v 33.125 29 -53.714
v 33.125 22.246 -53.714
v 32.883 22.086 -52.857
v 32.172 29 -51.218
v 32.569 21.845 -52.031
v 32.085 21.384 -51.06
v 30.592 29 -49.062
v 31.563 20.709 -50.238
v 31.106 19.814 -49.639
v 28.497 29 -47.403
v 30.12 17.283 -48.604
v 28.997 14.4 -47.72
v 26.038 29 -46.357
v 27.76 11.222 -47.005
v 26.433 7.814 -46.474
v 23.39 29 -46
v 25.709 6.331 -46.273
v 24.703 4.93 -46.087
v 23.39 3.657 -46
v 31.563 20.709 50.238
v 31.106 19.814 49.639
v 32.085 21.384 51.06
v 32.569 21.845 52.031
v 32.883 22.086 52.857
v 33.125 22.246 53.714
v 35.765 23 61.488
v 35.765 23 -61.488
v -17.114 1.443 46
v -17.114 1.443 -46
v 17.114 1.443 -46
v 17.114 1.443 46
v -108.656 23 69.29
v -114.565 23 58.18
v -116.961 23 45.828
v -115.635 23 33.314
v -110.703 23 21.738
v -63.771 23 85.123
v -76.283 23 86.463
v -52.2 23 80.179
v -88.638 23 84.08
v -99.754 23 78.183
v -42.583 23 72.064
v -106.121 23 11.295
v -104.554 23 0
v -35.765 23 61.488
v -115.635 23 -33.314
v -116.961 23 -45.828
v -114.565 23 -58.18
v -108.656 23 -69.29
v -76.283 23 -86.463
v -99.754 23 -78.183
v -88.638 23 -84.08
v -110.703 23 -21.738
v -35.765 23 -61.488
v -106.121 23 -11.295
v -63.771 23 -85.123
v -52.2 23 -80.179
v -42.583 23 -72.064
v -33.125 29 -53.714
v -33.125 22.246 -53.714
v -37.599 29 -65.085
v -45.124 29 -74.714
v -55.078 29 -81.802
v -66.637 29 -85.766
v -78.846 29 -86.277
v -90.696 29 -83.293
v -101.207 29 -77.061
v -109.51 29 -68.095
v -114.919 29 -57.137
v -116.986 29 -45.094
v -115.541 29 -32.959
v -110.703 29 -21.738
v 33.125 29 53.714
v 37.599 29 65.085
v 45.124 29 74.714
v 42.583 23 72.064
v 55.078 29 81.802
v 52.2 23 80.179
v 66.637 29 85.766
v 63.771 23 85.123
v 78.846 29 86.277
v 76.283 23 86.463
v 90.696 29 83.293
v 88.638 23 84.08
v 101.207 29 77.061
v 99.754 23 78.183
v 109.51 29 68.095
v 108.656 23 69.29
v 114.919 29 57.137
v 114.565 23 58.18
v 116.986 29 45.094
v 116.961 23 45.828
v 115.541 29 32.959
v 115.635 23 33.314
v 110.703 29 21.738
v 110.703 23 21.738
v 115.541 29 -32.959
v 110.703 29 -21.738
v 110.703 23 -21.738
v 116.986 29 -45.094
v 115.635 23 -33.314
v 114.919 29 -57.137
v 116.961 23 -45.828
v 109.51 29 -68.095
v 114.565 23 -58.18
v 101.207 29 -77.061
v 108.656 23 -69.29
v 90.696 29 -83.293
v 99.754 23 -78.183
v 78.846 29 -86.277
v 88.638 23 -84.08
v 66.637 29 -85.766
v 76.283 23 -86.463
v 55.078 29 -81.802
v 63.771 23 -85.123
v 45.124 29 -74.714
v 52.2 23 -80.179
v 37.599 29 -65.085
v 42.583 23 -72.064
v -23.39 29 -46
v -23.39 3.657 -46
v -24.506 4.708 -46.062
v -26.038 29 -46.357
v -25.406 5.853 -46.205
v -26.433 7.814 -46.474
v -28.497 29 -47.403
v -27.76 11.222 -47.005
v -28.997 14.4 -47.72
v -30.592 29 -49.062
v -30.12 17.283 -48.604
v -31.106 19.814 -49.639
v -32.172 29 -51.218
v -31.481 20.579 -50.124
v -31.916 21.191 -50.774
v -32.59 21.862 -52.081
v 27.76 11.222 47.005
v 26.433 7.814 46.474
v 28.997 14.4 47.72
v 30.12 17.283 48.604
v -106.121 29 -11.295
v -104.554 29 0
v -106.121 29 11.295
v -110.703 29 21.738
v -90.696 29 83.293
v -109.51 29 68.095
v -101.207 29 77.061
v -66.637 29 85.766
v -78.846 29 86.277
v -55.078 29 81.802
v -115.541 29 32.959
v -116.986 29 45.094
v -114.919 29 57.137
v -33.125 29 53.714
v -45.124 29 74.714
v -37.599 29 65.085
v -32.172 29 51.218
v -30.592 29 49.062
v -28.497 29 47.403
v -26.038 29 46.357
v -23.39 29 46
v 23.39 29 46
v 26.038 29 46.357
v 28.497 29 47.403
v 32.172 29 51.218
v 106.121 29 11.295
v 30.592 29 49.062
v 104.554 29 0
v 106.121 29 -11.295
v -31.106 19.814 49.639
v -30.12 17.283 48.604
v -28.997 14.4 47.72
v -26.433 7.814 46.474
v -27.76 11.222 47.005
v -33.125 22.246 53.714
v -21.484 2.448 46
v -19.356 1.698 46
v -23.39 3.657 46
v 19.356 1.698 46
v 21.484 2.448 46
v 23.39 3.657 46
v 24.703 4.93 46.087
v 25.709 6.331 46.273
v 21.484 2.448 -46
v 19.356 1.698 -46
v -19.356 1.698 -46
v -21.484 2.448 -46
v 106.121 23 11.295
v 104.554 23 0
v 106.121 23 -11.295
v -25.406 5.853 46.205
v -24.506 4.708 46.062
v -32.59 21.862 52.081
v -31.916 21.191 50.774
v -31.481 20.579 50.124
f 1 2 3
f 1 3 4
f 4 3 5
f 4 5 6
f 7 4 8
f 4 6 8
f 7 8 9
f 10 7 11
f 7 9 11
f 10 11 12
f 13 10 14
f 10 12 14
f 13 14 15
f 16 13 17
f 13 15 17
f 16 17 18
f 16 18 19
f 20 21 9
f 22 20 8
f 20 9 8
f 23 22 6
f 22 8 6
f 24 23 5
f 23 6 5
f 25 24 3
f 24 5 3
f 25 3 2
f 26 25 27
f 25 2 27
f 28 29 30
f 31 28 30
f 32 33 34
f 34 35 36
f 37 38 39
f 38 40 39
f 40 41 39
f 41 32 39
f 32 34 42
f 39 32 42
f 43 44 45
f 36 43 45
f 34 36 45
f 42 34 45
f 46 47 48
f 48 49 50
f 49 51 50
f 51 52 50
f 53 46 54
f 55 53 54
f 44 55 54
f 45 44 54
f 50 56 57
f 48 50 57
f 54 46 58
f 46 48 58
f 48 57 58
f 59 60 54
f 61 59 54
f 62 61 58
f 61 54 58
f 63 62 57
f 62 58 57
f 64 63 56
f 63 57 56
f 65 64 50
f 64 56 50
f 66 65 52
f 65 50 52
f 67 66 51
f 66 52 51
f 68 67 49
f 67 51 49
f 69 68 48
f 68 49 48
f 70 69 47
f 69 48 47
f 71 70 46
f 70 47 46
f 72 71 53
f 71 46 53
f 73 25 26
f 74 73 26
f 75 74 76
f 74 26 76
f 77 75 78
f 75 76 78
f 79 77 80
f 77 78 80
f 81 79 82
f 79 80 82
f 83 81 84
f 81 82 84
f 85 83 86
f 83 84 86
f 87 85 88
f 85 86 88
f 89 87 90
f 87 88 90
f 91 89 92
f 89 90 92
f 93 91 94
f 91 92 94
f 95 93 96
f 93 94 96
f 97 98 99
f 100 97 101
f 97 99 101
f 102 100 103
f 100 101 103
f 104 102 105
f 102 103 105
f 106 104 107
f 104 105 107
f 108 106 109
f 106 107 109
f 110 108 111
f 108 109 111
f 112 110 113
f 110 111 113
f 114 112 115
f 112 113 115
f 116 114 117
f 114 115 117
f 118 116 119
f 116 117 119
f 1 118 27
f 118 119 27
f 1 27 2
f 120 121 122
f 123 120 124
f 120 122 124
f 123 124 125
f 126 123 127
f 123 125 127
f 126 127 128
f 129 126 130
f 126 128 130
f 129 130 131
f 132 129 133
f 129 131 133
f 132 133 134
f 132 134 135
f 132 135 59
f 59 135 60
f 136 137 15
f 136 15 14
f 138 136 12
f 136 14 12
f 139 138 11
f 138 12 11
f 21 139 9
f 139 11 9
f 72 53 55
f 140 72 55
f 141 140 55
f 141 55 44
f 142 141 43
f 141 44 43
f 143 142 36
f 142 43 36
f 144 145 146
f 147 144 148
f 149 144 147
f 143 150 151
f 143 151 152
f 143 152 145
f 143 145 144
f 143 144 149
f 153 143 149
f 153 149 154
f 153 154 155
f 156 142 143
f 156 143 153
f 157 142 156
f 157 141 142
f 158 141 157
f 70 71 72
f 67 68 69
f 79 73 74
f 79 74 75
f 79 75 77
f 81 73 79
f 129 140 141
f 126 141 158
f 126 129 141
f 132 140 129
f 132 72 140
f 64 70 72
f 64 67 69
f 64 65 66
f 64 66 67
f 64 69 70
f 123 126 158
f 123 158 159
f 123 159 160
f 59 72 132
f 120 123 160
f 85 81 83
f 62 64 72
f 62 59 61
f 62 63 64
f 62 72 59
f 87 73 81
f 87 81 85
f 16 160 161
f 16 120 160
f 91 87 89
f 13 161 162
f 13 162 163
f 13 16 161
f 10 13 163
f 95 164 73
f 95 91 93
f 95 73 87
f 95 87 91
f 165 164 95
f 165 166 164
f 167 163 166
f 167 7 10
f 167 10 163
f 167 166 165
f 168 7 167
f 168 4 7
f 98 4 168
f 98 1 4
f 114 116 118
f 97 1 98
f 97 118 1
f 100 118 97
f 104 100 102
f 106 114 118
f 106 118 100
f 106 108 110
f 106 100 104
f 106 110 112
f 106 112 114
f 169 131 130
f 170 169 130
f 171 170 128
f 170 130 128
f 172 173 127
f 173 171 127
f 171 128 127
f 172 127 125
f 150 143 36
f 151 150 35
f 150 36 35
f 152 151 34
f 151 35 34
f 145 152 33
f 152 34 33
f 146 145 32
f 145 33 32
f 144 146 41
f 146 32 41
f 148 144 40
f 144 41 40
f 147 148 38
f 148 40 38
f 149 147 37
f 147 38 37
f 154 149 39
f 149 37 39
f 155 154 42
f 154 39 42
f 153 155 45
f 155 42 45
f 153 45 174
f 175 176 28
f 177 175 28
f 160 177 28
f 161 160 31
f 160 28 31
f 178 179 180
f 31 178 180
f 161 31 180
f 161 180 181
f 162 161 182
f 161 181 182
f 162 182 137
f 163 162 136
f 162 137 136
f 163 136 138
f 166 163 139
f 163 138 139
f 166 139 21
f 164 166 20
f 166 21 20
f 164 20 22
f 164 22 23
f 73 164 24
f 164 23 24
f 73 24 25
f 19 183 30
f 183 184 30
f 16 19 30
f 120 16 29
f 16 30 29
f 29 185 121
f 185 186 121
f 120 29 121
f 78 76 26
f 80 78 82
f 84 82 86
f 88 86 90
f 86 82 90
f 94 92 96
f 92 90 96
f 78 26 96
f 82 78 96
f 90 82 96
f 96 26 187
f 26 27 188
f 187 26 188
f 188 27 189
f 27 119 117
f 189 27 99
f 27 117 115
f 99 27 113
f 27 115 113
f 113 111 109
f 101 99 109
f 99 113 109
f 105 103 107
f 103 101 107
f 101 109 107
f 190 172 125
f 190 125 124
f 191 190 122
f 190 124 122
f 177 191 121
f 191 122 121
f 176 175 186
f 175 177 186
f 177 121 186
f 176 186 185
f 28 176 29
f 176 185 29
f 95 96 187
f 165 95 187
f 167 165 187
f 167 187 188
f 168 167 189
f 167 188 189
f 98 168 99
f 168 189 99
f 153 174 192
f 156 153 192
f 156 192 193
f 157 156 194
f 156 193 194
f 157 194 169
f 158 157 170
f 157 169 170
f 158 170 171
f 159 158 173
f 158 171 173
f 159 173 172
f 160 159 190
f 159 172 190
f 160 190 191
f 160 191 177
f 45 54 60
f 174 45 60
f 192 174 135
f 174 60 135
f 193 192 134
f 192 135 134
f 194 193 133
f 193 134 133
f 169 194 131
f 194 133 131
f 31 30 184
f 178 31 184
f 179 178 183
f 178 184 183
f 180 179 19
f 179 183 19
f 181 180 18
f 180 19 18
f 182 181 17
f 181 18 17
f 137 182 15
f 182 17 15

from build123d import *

# Parameters (mm, degrees)
BOSS_EXTRUDE1_DEPTH     = 29
CUT_EXTRUDE3_DEPTH      = 149.365258737
CUT_EXTRUDE3_DEPTH_BACK = 149.365258737


with BuildPart() as part:
    # Sketch2 → Boss-Extrude1 (new body)
    with BuildSketch(Plane(origin=(0, 0, 0), x_dir=(1, 0, 0), z_dir=(0, 1, 0))):
        with BuildLine():
            Line((-23.389824888, -46), (23.389824888, -46))
            ThreePointArc((23.389824888, -46), (29.600414922, -48.162361872), (33.125096338, -53.714285714))
            ThreePointArc((33.125096338, -53.714285714), (90.695873622, -83.293048719), (110.70300535, -21.738095238))
            ThreePointArc((110.70300535, -21.738095238), (104.55417528, 0), (110.70300535, 21.738095238))
            ThreePointArc((110.70300535, 21.738095238), (90.695873622, 83.293048719), (33.125096338, 53.714285714))
            ThreePointArc((33.125096338, 53.714285714), (29.600414922, 48.162361872), (23.389824888, 46))
            Line((23.389824888, 46), (-23.389824888, 46))
            ThreePointArc((-23.389824888, 46), (-29.600414922, 48.162361872), (-33.125096338, 53.714285714))
            ThreePointArc((-33.125096338, 53.714285714), (-90.695873622, 83.293048719), (-110.70300535, 21.738095238))
            ThreePointArc((-110.70300535, 21.738095238), (-104.55417528, 0), (-110.70300535, -21.738095238))
            ThreePointArc((-110.70300535, -21.738095238), (-90.695873622, -83.293048719), (-33.125096338, -53.714285714))
            ThreePointArc((-33.125096338, -53.714285714), (-29.600414922, -48.162361872), (-23.389824888, -46))
        make_face()
    extrude(amount=BOSS_EXTRUDE1_DEPTH)

    # Sketch4 → Cut-Extrude3 (cut, two sides: drawn at the far end of the back side and taken through both)
    with BuildSketch(Plane.XY.offset(-CUT_EXTRUDE3_DEPTH_BACK)):
        with BuildLine():
            Line((-597.255249838, 23), (-117, 23))
            Line((-117, 23), (-35.764946788, 23))
            ThreePointArc((-35.764946788, 23), (-32.942865818, 22.127451877), (-31.105745429, 19.814343599))
            Line((-31.105745429, 19.814343599), (-26.432815133, 7.814343599))
            ThreePointArc((-26.432815133, 7.814343599), (-22.758574356, 3.188127043), (-17.114412415, 1.443030797))
            Line((-17.114412415, 1.443030797), (17.114412415, 1.443030797))
            ThreePointArc((17.114412415, 1.443030797), (22.758574356, 3.188127043), (26.432815133, 7.814343599))
            Line((26.432815133, 7.814343599), (31.105745429, 19.814343599))
            ThreePointArc((31.105745429, 19.814343599), (32.942865818, 22.127451877), (35.764946788, 23))
            Line((35.764946788, 23), (117, 23))
            Line((117, 23), (597.255249838, 23))
            Line((597.255249838, 23), (597.255249838, -937.510499676))
            Line((597.255249838, -937.510499676), (-597.255249838, -937.510499676))
            Line((-597.255249838, -937.510499676), (-597.255249838, 23))
        make_face()
    extrude(amount=CUT_EXTRUDE3_DEPTH + CUT_EXTRUDE3_DEPTH_BACK, mode=Mode.SUBTRACT)


solid = part.part
